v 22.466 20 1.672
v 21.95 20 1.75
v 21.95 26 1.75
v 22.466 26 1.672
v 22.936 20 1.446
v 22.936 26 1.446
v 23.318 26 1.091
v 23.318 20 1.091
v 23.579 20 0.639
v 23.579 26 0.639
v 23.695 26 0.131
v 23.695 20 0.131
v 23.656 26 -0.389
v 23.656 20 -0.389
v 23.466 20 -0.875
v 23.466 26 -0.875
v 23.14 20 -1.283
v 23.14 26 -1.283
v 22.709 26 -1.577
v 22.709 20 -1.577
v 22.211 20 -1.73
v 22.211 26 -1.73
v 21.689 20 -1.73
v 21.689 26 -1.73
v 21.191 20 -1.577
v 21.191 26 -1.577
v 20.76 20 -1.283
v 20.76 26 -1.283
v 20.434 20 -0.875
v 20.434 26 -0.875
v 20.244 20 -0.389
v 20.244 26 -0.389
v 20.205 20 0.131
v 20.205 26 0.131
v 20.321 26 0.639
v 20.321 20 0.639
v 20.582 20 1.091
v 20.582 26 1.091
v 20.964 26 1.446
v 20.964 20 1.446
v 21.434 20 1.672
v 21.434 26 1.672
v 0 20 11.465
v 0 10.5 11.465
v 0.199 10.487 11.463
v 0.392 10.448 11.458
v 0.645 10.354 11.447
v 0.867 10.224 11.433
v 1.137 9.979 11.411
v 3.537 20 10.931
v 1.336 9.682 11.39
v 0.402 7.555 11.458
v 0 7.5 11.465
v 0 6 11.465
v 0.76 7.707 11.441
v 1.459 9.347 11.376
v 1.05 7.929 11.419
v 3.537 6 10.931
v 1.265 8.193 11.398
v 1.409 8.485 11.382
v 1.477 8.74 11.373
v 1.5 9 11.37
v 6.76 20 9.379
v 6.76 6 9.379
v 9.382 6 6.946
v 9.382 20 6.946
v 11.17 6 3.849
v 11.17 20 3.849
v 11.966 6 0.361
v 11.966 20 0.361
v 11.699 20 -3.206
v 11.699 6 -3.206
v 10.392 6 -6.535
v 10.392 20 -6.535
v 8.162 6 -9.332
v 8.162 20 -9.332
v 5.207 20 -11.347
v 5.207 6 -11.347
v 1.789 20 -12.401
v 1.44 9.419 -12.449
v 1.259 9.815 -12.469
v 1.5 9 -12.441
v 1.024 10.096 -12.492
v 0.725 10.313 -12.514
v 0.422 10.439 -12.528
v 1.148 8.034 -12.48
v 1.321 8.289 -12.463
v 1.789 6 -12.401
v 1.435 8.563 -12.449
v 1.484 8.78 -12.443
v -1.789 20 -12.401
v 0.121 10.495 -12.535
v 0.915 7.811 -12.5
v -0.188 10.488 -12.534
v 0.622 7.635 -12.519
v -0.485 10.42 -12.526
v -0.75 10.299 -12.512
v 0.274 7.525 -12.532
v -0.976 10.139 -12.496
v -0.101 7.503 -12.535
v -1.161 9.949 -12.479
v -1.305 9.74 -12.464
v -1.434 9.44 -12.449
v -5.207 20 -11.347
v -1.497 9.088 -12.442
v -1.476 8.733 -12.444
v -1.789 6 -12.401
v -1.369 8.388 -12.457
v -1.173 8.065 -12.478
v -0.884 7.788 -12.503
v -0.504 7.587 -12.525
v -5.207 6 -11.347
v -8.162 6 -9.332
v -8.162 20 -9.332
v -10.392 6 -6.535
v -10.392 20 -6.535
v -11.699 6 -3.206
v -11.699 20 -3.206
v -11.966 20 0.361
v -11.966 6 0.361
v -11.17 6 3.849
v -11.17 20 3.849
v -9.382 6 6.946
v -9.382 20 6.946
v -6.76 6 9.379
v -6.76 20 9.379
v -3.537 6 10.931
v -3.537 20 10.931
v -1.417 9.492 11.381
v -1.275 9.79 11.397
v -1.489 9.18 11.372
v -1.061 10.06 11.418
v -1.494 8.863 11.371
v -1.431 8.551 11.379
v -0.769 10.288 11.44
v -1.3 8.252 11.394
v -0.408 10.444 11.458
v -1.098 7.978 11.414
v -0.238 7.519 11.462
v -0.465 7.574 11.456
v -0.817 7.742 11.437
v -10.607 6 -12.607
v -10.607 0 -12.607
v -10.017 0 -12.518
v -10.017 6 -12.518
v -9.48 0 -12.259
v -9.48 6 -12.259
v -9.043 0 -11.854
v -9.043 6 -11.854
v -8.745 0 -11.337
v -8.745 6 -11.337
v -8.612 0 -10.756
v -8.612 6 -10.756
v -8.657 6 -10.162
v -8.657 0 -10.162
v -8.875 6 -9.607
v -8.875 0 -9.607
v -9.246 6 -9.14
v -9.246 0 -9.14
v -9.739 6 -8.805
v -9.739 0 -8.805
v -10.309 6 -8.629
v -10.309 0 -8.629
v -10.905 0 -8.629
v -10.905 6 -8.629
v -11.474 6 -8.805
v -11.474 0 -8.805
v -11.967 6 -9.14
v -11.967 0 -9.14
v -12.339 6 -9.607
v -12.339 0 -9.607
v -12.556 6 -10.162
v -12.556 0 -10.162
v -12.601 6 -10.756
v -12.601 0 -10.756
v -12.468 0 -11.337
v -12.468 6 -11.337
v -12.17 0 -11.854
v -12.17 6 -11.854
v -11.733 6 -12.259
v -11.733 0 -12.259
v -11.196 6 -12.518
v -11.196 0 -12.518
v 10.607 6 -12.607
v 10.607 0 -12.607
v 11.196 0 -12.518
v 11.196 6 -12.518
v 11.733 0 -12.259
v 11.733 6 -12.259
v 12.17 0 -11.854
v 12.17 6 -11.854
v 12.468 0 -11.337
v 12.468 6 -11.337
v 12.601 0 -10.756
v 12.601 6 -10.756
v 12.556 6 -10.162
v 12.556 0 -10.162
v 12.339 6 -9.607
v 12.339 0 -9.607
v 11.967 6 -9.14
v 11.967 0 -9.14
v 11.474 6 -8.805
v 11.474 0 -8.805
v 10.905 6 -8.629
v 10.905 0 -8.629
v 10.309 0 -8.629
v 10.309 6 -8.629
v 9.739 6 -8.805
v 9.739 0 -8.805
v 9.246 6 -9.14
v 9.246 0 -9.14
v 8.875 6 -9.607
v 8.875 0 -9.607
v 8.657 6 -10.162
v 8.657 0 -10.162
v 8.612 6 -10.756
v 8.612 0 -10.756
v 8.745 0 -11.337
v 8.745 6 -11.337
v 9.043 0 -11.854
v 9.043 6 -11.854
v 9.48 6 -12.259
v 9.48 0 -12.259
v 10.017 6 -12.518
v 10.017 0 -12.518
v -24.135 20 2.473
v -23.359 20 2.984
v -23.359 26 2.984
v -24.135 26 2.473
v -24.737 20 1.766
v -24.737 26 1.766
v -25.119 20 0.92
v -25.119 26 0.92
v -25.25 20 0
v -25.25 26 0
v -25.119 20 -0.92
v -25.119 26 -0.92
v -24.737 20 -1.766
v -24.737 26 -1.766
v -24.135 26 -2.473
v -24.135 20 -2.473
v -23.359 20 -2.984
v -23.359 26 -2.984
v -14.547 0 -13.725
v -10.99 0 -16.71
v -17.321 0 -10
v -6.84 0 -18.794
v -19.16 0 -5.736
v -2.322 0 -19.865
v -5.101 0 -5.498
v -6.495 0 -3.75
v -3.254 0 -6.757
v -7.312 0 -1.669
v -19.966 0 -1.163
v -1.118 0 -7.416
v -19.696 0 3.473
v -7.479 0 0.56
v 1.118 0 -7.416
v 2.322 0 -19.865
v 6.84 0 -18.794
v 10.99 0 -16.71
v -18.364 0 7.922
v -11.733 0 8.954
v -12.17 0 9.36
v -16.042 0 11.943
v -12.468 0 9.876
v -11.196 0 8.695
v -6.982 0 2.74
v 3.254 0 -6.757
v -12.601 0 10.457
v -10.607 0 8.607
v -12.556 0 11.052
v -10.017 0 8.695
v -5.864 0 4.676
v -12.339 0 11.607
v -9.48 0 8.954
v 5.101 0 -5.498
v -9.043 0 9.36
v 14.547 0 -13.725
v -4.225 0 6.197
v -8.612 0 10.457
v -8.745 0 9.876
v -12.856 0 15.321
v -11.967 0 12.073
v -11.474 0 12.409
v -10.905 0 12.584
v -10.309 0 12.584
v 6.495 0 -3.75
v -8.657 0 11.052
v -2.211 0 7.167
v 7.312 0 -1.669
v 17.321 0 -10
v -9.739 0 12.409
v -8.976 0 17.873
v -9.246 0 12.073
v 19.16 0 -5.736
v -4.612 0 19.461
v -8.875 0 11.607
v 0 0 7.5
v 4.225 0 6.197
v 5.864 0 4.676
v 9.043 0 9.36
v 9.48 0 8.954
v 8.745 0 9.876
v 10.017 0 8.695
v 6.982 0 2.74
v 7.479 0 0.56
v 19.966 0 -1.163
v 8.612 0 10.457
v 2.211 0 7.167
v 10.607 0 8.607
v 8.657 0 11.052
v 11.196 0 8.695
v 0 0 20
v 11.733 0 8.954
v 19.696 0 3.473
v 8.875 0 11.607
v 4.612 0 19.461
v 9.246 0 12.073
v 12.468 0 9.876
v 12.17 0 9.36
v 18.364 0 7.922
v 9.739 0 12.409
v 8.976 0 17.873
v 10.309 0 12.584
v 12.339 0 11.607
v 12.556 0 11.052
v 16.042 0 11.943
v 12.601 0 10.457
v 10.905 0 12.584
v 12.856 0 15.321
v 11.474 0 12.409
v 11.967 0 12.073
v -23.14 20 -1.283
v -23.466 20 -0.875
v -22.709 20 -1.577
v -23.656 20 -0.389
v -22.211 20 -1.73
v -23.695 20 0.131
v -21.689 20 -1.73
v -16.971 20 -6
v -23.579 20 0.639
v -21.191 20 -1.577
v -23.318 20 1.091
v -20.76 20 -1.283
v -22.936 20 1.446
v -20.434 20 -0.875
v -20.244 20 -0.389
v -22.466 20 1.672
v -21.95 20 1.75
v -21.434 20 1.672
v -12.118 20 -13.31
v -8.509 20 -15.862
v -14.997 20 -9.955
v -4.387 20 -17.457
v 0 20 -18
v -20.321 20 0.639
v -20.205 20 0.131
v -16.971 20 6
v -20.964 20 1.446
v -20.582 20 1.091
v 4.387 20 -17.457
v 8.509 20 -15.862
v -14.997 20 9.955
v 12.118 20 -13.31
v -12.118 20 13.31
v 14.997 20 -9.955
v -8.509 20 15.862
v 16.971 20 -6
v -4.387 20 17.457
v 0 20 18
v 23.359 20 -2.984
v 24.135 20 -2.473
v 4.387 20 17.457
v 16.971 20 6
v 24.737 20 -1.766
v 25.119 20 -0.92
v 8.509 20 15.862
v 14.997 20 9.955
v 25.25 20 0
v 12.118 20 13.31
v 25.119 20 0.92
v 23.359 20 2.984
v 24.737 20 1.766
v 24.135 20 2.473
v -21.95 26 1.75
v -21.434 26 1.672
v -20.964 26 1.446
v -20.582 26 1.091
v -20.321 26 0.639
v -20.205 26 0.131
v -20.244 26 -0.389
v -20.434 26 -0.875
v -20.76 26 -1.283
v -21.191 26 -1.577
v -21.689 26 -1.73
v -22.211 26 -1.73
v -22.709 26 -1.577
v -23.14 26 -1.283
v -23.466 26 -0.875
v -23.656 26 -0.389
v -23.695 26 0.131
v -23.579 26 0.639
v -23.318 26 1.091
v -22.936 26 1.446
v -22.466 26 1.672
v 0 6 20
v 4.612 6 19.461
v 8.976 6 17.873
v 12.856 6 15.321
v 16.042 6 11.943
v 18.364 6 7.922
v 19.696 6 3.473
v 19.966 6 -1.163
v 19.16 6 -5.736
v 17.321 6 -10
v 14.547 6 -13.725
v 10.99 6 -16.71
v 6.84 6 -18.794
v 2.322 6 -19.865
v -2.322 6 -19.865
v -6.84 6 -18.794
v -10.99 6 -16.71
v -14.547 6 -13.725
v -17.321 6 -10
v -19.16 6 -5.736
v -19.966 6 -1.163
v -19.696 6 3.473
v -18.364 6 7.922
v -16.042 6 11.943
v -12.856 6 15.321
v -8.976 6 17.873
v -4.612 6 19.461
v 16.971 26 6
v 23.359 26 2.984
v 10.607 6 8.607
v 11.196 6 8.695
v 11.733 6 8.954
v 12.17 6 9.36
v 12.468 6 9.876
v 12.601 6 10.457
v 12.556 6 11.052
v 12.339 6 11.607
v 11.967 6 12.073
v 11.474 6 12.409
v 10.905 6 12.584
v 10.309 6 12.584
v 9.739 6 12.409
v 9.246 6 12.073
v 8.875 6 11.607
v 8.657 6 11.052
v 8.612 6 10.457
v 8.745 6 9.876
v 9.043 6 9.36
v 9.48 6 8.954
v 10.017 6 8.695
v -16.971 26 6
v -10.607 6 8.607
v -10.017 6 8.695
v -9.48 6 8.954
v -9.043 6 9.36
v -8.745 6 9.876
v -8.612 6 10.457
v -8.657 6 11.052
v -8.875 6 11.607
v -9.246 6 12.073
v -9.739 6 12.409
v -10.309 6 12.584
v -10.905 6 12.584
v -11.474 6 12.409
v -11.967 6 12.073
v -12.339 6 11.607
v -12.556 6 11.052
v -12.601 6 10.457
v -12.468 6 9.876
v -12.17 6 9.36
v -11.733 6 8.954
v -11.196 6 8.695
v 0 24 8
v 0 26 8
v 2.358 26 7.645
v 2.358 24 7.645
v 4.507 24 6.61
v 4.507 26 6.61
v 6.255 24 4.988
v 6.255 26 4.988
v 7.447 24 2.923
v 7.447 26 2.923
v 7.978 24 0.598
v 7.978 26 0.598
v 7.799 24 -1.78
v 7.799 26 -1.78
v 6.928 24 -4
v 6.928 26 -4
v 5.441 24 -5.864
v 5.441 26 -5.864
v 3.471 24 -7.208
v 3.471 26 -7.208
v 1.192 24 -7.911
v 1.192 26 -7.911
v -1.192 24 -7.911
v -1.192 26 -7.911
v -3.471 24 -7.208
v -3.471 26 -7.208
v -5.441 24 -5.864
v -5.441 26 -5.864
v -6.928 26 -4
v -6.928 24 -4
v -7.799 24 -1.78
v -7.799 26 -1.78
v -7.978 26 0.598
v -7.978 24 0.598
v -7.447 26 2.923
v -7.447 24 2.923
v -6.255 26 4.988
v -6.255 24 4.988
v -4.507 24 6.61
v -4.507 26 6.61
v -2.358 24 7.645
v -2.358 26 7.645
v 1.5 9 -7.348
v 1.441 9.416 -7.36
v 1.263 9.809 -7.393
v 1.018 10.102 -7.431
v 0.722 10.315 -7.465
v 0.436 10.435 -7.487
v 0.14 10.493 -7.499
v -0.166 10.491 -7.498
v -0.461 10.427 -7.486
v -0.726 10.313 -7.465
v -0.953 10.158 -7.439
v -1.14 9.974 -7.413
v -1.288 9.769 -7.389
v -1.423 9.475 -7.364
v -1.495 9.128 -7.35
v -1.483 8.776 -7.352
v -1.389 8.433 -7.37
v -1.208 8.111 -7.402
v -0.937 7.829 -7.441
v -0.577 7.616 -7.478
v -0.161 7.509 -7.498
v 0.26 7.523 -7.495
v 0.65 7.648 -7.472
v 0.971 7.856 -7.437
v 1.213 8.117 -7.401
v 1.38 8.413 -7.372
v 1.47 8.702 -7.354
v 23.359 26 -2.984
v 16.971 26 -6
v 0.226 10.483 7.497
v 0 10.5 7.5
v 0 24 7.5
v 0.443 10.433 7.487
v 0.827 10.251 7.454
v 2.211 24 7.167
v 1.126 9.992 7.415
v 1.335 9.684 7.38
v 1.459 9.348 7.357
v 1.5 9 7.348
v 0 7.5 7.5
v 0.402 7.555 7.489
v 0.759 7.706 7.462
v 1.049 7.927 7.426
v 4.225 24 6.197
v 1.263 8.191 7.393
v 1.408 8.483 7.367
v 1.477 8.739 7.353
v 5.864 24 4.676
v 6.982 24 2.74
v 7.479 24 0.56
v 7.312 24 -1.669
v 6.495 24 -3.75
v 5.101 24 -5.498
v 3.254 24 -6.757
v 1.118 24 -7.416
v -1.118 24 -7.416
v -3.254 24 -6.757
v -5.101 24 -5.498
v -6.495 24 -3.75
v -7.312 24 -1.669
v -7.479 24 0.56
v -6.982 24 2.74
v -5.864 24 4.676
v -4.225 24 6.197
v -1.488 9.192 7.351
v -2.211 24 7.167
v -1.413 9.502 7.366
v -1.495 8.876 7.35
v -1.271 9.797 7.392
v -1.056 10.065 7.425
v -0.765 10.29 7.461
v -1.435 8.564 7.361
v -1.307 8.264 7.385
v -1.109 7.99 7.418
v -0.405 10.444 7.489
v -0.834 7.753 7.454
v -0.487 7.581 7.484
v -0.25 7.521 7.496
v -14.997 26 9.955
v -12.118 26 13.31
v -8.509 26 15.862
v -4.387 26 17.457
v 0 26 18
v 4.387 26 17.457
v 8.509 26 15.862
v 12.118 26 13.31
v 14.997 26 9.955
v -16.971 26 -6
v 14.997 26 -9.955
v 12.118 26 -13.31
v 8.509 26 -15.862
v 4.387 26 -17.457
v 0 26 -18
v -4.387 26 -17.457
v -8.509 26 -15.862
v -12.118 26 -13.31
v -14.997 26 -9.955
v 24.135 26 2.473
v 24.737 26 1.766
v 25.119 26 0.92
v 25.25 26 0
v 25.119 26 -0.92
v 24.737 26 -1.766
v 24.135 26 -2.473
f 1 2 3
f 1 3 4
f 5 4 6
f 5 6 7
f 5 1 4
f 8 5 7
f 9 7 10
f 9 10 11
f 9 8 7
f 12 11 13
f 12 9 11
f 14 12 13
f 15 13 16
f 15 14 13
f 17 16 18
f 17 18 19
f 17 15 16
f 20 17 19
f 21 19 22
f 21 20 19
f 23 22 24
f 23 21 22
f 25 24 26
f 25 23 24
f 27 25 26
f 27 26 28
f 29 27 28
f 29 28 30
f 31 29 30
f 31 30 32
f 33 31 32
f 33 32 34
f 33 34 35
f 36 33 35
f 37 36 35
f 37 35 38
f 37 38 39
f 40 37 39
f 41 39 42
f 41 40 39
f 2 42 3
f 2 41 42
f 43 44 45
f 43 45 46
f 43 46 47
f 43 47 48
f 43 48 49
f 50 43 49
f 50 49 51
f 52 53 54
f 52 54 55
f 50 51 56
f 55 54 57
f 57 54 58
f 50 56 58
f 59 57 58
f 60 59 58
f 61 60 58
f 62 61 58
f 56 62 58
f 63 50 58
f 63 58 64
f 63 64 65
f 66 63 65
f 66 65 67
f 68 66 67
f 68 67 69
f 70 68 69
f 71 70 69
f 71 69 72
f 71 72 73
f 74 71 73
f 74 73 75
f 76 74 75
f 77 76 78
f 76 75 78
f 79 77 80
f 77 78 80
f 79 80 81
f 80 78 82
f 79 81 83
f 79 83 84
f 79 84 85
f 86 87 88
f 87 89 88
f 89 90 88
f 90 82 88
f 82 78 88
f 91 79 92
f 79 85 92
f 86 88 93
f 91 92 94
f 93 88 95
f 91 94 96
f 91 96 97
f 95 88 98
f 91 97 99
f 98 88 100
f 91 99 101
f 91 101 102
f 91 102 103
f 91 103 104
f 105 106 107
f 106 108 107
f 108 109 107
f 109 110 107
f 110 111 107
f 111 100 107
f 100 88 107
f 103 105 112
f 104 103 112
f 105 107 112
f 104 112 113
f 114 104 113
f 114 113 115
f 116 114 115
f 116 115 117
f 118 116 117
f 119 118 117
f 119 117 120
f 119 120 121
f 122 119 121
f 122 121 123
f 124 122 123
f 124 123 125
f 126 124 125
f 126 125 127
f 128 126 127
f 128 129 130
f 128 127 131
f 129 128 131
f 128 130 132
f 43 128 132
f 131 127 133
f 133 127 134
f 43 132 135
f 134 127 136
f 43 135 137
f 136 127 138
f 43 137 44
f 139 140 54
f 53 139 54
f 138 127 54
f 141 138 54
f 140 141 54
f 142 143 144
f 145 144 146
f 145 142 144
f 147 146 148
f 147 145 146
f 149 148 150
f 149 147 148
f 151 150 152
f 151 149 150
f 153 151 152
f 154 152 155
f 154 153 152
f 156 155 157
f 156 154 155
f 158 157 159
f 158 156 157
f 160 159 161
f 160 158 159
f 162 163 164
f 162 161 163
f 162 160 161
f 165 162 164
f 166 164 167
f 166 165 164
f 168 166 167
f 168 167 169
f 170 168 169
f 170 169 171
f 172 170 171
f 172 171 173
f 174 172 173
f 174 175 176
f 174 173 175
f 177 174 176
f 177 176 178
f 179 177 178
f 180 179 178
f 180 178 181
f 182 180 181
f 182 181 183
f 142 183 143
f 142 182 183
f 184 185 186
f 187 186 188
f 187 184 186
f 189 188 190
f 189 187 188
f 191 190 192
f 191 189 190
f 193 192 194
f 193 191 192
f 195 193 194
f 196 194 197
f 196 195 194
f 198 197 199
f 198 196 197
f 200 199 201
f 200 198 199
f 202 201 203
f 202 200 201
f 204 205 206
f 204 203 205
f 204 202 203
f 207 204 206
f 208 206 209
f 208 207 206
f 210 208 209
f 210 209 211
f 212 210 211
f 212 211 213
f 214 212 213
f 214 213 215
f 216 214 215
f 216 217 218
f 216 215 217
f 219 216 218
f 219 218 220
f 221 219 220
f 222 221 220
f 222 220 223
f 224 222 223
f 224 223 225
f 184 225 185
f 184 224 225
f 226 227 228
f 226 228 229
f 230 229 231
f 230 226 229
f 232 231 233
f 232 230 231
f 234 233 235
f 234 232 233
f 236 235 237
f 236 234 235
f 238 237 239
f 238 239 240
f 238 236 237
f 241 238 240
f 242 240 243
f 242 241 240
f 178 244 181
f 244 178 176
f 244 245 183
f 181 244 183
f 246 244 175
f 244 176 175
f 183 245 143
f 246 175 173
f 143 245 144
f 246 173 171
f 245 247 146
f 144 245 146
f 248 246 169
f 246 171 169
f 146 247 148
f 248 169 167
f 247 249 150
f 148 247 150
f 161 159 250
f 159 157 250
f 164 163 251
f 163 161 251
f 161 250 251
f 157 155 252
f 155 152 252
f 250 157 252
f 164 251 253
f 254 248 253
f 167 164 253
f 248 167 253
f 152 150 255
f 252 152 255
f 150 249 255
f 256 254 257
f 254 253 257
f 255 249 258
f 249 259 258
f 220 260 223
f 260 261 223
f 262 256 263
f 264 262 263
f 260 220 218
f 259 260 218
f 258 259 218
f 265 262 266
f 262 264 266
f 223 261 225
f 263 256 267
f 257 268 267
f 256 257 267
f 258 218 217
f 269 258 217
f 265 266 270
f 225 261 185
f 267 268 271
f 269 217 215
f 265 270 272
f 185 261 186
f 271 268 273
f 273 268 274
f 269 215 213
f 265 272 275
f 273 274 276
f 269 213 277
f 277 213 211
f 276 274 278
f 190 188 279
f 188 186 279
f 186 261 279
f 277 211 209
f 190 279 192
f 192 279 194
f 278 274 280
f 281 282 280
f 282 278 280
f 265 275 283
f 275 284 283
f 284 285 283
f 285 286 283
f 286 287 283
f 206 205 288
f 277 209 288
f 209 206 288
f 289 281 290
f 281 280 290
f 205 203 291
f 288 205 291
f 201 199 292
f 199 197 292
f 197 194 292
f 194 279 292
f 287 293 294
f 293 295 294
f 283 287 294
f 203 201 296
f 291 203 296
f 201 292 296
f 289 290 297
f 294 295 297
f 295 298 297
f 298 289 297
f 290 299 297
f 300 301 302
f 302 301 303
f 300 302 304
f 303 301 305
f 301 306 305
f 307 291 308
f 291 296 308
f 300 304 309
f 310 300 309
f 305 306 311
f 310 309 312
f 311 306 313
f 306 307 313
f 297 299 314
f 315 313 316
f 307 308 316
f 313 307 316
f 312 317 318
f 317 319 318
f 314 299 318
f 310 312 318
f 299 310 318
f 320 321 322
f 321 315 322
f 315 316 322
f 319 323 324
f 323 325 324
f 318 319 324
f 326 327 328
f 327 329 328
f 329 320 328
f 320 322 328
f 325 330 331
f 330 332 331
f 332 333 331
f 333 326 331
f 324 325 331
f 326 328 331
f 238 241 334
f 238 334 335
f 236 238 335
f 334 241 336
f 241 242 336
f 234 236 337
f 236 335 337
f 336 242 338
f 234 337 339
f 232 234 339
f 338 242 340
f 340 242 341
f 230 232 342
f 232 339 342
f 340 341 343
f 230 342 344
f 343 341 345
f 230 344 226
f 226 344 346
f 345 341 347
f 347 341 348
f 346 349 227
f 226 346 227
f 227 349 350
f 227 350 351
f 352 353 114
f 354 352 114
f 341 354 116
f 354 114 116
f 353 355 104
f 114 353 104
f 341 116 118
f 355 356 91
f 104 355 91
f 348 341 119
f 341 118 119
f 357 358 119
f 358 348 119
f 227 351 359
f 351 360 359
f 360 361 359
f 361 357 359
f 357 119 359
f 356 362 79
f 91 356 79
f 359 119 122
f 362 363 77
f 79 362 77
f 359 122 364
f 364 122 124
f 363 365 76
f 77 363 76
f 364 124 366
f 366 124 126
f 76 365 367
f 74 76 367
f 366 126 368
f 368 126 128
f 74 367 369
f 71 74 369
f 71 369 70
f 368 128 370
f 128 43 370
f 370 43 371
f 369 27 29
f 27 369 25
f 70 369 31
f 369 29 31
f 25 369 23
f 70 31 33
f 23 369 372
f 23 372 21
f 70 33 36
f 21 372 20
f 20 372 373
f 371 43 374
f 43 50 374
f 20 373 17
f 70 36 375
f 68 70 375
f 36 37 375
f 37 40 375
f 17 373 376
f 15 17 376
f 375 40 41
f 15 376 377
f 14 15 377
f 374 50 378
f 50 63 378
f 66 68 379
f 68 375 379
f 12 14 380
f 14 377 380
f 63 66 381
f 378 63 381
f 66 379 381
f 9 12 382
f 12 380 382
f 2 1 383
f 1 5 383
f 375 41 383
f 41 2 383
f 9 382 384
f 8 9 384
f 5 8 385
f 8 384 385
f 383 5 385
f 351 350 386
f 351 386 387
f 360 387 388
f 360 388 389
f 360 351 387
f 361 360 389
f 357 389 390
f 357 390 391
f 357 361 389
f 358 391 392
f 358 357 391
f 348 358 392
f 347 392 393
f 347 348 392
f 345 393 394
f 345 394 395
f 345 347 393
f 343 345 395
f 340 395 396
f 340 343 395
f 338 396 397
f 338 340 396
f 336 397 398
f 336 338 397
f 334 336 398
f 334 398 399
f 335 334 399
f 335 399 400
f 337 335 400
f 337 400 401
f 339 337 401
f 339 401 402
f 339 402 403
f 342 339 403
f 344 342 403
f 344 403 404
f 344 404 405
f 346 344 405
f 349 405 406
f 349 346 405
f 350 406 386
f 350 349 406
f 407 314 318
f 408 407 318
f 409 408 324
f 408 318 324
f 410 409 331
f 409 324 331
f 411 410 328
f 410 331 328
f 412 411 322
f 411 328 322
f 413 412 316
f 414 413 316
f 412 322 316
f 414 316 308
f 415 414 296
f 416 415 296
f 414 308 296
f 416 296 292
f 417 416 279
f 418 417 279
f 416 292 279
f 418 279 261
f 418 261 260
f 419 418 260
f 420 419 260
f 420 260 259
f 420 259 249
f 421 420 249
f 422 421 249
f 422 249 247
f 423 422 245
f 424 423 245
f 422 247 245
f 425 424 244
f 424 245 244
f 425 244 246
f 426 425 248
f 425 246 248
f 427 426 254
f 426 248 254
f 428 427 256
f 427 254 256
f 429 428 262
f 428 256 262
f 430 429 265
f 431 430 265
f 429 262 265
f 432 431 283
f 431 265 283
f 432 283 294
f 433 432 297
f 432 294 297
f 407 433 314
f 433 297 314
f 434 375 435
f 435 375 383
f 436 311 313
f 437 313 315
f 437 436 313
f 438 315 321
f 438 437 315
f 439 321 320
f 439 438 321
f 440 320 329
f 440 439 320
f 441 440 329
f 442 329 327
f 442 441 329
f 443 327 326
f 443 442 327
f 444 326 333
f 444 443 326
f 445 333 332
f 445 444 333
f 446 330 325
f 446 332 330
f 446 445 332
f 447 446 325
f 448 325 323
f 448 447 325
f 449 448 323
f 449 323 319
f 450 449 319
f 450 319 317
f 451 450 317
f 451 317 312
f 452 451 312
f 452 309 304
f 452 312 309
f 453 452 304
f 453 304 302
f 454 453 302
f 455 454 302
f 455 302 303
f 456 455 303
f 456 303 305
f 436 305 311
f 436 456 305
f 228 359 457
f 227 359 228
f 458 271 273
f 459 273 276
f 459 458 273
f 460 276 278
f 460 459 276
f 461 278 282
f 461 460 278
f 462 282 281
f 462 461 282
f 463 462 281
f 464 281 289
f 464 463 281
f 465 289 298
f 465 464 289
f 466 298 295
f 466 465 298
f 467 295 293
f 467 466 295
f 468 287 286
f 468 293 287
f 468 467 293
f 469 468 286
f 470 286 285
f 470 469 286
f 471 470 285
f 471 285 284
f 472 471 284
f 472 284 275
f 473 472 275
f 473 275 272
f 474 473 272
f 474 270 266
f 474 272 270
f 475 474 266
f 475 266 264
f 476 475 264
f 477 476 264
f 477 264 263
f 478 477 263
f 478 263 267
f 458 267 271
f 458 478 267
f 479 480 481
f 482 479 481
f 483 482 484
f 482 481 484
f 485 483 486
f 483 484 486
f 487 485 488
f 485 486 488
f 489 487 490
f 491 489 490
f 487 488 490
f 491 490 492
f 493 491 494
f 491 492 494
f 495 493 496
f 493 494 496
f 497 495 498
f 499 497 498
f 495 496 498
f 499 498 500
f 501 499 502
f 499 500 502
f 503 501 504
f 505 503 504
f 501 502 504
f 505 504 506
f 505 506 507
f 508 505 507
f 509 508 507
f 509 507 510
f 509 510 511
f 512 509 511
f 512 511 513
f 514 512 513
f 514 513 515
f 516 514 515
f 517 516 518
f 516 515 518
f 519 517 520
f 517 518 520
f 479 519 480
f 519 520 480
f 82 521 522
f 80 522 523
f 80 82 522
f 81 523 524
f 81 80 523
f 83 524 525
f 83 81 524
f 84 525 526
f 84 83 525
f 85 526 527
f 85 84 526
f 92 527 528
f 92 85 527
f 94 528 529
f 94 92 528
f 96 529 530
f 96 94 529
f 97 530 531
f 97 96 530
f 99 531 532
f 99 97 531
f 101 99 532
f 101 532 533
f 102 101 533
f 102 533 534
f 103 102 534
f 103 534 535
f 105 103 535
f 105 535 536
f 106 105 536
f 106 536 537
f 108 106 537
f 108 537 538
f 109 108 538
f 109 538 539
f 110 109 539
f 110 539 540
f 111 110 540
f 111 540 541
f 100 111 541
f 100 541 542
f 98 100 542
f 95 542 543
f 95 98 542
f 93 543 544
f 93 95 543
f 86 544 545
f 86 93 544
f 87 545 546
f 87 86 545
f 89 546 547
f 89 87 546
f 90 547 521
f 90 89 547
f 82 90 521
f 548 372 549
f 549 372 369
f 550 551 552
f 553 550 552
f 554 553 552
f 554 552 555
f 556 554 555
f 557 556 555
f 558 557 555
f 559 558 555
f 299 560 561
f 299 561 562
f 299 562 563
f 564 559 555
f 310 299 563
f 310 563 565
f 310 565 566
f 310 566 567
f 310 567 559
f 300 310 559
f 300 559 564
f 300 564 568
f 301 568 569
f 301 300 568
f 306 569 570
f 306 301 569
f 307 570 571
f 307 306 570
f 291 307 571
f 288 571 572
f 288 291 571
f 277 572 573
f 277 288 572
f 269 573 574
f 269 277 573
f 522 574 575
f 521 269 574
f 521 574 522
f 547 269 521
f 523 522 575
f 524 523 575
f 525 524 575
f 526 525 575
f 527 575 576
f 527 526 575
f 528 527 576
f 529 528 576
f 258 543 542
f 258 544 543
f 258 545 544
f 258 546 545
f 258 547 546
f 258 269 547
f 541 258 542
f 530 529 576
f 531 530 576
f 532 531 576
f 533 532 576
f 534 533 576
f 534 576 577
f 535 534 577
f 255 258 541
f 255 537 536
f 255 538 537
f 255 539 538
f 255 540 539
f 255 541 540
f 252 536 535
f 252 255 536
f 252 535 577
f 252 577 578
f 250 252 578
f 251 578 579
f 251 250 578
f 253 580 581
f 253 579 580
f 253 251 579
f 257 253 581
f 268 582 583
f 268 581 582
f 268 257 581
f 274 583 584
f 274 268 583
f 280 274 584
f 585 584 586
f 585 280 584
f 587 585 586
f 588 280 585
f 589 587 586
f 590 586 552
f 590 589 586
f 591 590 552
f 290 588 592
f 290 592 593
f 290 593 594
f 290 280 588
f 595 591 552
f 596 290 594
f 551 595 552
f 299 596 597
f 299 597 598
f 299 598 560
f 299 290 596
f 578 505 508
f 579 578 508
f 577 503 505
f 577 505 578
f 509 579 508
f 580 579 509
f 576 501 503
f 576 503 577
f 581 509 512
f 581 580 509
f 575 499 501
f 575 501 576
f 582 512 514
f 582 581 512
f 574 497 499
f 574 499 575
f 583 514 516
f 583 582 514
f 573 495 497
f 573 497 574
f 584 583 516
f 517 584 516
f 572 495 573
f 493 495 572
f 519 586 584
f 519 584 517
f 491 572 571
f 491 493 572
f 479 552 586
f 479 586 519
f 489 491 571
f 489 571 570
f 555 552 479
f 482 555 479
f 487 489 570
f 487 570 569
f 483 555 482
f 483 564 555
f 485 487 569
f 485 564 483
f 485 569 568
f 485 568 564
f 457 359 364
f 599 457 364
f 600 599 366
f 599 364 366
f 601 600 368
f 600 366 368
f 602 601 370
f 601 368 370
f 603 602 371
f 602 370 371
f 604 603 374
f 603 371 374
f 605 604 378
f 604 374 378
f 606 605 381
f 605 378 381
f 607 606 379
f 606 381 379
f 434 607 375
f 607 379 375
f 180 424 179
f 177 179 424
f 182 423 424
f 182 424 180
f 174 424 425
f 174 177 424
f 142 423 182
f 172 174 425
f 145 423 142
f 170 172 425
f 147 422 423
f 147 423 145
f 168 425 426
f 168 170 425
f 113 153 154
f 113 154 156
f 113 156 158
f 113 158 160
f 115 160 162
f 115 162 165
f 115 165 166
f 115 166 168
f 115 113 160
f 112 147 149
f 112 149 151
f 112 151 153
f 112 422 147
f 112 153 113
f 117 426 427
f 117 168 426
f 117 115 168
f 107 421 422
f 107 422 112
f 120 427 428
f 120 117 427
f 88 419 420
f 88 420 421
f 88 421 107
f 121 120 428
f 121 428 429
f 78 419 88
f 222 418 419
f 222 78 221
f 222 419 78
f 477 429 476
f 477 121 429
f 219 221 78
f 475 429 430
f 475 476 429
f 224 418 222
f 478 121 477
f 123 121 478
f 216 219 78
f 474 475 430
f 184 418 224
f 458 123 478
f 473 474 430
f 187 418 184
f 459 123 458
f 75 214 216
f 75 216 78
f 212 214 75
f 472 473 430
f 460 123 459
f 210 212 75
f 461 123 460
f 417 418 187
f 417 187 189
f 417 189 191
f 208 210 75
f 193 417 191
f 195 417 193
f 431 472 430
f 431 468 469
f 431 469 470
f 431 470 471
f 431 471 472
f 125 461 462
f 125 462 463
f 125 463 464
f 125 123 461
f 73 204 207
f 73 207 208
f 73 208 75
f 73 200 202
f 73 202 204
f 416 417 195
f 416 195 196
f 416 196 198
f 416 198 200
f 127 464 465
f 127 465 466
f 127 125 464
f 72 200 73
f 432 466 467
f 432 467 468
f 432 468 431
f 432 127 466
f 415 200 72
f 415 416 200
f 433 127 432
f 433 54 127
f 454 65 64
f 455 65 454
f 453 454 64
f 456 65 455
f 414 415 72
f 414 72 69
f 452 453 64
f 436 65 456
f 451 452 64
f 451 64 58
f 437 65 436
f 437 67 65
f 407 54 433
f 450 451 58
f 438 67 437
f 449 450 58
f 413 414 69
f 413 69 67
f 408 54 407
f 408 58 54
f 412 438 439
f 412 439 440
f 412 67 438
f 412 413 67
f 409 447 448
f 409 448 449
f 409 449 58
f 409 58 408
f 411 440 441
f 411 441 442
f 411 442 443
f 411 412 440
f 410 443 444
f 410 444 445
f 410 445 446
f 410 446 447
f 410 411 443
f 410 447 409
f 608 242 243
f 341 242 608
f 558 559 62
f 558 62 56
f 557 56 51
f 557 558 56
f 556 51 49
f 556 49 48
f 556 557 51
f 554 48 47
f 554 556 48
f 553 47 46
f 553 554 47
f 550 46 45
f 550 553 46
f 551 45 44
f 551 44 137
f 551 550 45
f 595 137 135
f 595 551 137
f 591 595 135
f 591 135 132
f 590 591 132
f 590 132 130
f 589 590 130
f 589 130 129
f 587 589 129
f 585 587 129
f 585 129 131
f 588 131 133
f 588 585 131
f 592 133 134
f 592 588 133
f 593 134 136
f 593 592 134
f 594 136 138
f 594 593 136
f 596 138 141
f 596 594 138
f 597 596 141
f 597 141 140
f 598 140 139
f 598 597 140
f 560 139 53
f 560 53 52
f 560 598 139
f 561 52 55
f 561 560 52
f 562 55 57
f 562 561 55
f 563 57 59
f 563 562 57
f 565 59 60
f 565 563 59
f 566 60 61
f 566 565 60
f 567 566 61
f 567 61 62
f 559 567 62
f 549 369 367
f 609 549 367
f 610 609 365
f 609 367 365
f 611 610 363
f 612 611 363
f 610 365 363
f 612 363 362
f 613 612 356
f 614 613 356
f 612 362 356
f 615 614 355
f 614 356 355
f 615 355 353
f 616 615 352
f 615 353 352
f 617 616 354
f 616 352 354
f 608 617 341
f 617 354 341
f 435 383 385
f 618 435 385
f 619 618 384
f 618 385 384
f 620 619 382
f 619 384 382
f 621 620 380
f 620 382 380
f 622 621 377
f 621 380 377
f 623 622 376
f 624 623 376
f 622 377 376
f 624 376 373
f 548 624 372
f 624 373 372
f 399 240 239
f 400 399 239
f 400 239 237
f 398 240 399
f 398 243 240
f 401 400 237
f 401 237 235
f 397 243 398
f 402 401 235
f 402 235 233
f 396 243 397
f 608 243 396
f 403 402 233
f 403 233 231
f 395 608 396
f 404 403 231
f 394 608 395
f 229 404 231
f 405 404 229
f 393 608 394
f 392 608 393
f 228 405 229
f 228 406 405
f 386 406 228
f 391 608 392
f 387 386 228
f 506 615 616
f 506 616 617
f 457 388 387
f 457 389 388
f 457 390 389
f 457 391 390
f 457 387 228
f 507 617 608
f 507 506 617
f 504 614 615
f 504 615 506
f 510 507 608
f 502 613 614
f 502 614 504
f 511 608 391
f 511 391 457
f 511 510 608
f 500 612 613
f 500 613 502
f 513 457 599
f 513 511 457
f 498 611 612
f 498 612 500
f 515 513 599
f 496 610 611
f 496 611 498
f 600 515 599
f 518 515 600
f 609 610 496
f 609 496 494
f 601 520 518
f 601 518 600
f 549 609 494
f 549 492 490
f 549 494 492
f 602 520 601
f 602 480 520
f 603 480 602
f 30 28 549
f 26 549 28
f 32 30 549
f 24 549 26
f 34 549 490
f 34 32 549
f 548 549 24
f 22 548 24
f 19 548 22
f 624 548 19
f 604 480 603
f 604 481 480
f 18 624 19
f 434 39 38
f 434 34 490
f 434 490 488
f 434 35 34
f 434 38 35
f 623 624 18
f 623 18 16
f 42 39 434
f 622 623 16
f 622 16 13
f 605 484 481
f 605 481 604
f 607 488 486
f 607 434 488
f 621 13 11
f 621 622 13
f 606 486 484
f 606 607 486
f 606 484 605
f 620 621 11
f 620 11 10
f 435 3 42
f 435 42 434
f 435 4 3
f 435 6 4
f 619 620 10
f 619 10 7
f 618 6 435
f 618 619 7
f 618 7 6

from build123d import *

# Parameters (mm, degrees)
SKETCH1_R               = 20
SKETCH1_R_2             = 7.5
BOSS_EXTRUDE1_DEPTH     = 6
SKETCH2_R               = 12
SKETCH2_R_2             = 7.5
BOSS_EXTRUDE2_DEPTH     = 14
CUT_EXTRUDE1_DEPTH      = 35.641016151
CUT_EXTRUDE1_DEPTH_BACK = 35.641016151
SKETCH3_R               = 1.5
SKETCH4_R               = 18
SKETCH4_R_2             = 7.5
BOSS_EXTRUDE3_DEPTH     = 6
BOSS_EXTRUDE4_START     = -6
SKETCH5_R               = 1.75
BOSS_EXTRUDE4_DEPTH     = 6
CUT_EXTRUDE2_DEPTH      = 42.39519906
CUT_EXTRUDE2_DEPTH_BACK = 6
SKETCH6_R               = 2
SKETCH7_R               = 8
CUT_EXTRUDE3_DEPTH      = 2


with BuildPart() as part:
    # Sketch1 → Boss-Extrude1 (new body)
    with BuildSketch(Plane(origin=(0, 0, 0), x_dir=(1, 0, 0), z_dir=(0, 1, 0))):
        with Locations(Location((0, 0, 0), (0, 0, 270))):
            Circle(SKETCH1_R)
        with Locations(Location((0, 0, 0), (0, 0, 270))):
            Circle(SKETCH1_R_2, mode=Mode.SUBTRACT)
    extrude(amount=BOSS_EXTRUDE1_DEPTH)

    # Sketch2 → Boss-Extrude2 (add)
    with BuildSketch(Plane(origin=(0, 6, 0), x_dir=(1, 0, 0), z_dir=(0, 1, 0))):
        with Locations(Location((0, 0.535416774, 0), (0, 0, 270))):
            Circle(SKETCH2_R)
        with Locations(Location((0, 0, 0), (0, 0, 270))):
            Circle(SKETCH2_R_2, mode=Mode.SUBTRACT)
    extrude(amount=BOSS_EXTRUDE2_DEPTH)

    # Sketch3 → Cut-Extrude1 (cut, two sides: drawn at the far end of the back side and taken through both)
    with BuildSketch(Plane.XY.offset(-CUT_EXTRUDE1_DEPTH_BACK)):
        with Locations((0, 9)):
            Circle(SKETCH3_R)
    extrude(amount=CUT_EXTRUDE1_DEPTH + CUT_EXTRUDE1_DEPTH_BACK, mode=Mode.SUBTRACT)

    # Sketch4 → Boss-Extrude3 (add)
    with BuildSketch(Plane(origin=(0, 20, 0), x_dir=(1, 0, 0), z_dir=(0, 1, 0))):
        with Locations(Location((0, 0, 0), (0, 0, 270))):
            Circle(SKETCH4_R)
        with Locations(Location((0, 0, 0), (0, 0, 270))):
            Circle(SKETCH4_R_2, mode=Mode.SUBTRACT)
    extrude(amount=BOSS_EXTRUDE3_DEPTH)

    # Sketch5 → Boss-Extrude4 (add)
    # profile 1 of 2: a face of its own
    with BuildSketch(Plane(origin=(0, 26, 0), x_dir=(1, 0, 0), z_dir=(0, 1, 0)).offset(BOSS_EXTRUDE4_START)):
        with BuildLine():
            Line((-23.358800107, 2.984171955), (-16.970562748, 6))
            ThreePointArc((-16.970562748, 6), (-18, 0), (-16.970562748, -6))
            Line((-16.970562748, -6), (-23.358800107, -2.984171955))
            ThreePointArc((-23.358800107, -2.984171955), (-25.25, 0), (-23.358800107, 2.984171955))
        make_face()
        with Locations(Location((-21.95, 0, 0), (0, 0, 270))):
            Circle(SKETCH5_R, mode=Mode.SUBTRACT)
    # profile 2 of 2: a face of its own
    with BuildSketch(Plane(origin=(0, 26, 0), x_dir=(1, 0, 0), z_dir=(0, 1, 0)).offset(BOSS_EXTRUDE4_START)):
        with BuildLine():
            Line((23.358800107, 2.984171955), (16.970562748, 6))
            ThreePointArc((16.970562748, 6), (18, 0), (16.970562748, -6))
            Line((16.970562748, -6), (23.358800107, -2.984171955))
            ThreePointArc((23.358800107, -2.984171955), (25.25, 0), (23.358800107, 2.984171955))
        make_face()
        with Locations(Location((21.95, 0, 0), (0, 0, 270))):
            Circle(SKETCH5_R, mode=Mode.SUBTRACT)
    extrude(amount=BOSS_EXTRUDE4_DEPTH)

    # Sketch6 → Cut-Extrude2 (cut, two sides: drawn at the far end of the back side and taken through both)
    with BuildSketch(Plane.XZ.offset(-CUT_EXTRUDE2_DEPTH_BACK)):
        with Locations(Location((-10.606601718, 10.606601718, 0), (0, 0, 270))):
            Circle(SKETCH6_R)
        with Locations(Location((10.606601718, 10.606601718, 0), (0, 0, 270))):
            Circle(SKETCH6_R)
        with Locations(Location((10.606601718, -10.606601718, 0), (0, 0, 270))):
            Circle(SKETCH6_R)
        with Locations(Location((-10.606601718, -10.606601718, 0), (0, 0, 270))):
            Circle(SKETCH6_R)
    extrude(amount=CUT_EXTRUDE2_DEPTH + CUT_EXTRUDE2_DEPTH_BACK, mode=Mode.SUBTRACT)

    # Sketch7 → Cut-Extrude3 (cut)
    with BuildSketch(Plane(origin=(0, 26, 0), x_dir=(1, 0, 0), z_dir=(0, 1, 0))):
        with Locations(Location((0, 0, 0), (0, 0, 270))):
            Circle(SKETCH7_R)
    extrude(amount=-CUT_EXTRUDE3_DEPTH, mode=Mode.SUBTRACT)


solid = part.part
